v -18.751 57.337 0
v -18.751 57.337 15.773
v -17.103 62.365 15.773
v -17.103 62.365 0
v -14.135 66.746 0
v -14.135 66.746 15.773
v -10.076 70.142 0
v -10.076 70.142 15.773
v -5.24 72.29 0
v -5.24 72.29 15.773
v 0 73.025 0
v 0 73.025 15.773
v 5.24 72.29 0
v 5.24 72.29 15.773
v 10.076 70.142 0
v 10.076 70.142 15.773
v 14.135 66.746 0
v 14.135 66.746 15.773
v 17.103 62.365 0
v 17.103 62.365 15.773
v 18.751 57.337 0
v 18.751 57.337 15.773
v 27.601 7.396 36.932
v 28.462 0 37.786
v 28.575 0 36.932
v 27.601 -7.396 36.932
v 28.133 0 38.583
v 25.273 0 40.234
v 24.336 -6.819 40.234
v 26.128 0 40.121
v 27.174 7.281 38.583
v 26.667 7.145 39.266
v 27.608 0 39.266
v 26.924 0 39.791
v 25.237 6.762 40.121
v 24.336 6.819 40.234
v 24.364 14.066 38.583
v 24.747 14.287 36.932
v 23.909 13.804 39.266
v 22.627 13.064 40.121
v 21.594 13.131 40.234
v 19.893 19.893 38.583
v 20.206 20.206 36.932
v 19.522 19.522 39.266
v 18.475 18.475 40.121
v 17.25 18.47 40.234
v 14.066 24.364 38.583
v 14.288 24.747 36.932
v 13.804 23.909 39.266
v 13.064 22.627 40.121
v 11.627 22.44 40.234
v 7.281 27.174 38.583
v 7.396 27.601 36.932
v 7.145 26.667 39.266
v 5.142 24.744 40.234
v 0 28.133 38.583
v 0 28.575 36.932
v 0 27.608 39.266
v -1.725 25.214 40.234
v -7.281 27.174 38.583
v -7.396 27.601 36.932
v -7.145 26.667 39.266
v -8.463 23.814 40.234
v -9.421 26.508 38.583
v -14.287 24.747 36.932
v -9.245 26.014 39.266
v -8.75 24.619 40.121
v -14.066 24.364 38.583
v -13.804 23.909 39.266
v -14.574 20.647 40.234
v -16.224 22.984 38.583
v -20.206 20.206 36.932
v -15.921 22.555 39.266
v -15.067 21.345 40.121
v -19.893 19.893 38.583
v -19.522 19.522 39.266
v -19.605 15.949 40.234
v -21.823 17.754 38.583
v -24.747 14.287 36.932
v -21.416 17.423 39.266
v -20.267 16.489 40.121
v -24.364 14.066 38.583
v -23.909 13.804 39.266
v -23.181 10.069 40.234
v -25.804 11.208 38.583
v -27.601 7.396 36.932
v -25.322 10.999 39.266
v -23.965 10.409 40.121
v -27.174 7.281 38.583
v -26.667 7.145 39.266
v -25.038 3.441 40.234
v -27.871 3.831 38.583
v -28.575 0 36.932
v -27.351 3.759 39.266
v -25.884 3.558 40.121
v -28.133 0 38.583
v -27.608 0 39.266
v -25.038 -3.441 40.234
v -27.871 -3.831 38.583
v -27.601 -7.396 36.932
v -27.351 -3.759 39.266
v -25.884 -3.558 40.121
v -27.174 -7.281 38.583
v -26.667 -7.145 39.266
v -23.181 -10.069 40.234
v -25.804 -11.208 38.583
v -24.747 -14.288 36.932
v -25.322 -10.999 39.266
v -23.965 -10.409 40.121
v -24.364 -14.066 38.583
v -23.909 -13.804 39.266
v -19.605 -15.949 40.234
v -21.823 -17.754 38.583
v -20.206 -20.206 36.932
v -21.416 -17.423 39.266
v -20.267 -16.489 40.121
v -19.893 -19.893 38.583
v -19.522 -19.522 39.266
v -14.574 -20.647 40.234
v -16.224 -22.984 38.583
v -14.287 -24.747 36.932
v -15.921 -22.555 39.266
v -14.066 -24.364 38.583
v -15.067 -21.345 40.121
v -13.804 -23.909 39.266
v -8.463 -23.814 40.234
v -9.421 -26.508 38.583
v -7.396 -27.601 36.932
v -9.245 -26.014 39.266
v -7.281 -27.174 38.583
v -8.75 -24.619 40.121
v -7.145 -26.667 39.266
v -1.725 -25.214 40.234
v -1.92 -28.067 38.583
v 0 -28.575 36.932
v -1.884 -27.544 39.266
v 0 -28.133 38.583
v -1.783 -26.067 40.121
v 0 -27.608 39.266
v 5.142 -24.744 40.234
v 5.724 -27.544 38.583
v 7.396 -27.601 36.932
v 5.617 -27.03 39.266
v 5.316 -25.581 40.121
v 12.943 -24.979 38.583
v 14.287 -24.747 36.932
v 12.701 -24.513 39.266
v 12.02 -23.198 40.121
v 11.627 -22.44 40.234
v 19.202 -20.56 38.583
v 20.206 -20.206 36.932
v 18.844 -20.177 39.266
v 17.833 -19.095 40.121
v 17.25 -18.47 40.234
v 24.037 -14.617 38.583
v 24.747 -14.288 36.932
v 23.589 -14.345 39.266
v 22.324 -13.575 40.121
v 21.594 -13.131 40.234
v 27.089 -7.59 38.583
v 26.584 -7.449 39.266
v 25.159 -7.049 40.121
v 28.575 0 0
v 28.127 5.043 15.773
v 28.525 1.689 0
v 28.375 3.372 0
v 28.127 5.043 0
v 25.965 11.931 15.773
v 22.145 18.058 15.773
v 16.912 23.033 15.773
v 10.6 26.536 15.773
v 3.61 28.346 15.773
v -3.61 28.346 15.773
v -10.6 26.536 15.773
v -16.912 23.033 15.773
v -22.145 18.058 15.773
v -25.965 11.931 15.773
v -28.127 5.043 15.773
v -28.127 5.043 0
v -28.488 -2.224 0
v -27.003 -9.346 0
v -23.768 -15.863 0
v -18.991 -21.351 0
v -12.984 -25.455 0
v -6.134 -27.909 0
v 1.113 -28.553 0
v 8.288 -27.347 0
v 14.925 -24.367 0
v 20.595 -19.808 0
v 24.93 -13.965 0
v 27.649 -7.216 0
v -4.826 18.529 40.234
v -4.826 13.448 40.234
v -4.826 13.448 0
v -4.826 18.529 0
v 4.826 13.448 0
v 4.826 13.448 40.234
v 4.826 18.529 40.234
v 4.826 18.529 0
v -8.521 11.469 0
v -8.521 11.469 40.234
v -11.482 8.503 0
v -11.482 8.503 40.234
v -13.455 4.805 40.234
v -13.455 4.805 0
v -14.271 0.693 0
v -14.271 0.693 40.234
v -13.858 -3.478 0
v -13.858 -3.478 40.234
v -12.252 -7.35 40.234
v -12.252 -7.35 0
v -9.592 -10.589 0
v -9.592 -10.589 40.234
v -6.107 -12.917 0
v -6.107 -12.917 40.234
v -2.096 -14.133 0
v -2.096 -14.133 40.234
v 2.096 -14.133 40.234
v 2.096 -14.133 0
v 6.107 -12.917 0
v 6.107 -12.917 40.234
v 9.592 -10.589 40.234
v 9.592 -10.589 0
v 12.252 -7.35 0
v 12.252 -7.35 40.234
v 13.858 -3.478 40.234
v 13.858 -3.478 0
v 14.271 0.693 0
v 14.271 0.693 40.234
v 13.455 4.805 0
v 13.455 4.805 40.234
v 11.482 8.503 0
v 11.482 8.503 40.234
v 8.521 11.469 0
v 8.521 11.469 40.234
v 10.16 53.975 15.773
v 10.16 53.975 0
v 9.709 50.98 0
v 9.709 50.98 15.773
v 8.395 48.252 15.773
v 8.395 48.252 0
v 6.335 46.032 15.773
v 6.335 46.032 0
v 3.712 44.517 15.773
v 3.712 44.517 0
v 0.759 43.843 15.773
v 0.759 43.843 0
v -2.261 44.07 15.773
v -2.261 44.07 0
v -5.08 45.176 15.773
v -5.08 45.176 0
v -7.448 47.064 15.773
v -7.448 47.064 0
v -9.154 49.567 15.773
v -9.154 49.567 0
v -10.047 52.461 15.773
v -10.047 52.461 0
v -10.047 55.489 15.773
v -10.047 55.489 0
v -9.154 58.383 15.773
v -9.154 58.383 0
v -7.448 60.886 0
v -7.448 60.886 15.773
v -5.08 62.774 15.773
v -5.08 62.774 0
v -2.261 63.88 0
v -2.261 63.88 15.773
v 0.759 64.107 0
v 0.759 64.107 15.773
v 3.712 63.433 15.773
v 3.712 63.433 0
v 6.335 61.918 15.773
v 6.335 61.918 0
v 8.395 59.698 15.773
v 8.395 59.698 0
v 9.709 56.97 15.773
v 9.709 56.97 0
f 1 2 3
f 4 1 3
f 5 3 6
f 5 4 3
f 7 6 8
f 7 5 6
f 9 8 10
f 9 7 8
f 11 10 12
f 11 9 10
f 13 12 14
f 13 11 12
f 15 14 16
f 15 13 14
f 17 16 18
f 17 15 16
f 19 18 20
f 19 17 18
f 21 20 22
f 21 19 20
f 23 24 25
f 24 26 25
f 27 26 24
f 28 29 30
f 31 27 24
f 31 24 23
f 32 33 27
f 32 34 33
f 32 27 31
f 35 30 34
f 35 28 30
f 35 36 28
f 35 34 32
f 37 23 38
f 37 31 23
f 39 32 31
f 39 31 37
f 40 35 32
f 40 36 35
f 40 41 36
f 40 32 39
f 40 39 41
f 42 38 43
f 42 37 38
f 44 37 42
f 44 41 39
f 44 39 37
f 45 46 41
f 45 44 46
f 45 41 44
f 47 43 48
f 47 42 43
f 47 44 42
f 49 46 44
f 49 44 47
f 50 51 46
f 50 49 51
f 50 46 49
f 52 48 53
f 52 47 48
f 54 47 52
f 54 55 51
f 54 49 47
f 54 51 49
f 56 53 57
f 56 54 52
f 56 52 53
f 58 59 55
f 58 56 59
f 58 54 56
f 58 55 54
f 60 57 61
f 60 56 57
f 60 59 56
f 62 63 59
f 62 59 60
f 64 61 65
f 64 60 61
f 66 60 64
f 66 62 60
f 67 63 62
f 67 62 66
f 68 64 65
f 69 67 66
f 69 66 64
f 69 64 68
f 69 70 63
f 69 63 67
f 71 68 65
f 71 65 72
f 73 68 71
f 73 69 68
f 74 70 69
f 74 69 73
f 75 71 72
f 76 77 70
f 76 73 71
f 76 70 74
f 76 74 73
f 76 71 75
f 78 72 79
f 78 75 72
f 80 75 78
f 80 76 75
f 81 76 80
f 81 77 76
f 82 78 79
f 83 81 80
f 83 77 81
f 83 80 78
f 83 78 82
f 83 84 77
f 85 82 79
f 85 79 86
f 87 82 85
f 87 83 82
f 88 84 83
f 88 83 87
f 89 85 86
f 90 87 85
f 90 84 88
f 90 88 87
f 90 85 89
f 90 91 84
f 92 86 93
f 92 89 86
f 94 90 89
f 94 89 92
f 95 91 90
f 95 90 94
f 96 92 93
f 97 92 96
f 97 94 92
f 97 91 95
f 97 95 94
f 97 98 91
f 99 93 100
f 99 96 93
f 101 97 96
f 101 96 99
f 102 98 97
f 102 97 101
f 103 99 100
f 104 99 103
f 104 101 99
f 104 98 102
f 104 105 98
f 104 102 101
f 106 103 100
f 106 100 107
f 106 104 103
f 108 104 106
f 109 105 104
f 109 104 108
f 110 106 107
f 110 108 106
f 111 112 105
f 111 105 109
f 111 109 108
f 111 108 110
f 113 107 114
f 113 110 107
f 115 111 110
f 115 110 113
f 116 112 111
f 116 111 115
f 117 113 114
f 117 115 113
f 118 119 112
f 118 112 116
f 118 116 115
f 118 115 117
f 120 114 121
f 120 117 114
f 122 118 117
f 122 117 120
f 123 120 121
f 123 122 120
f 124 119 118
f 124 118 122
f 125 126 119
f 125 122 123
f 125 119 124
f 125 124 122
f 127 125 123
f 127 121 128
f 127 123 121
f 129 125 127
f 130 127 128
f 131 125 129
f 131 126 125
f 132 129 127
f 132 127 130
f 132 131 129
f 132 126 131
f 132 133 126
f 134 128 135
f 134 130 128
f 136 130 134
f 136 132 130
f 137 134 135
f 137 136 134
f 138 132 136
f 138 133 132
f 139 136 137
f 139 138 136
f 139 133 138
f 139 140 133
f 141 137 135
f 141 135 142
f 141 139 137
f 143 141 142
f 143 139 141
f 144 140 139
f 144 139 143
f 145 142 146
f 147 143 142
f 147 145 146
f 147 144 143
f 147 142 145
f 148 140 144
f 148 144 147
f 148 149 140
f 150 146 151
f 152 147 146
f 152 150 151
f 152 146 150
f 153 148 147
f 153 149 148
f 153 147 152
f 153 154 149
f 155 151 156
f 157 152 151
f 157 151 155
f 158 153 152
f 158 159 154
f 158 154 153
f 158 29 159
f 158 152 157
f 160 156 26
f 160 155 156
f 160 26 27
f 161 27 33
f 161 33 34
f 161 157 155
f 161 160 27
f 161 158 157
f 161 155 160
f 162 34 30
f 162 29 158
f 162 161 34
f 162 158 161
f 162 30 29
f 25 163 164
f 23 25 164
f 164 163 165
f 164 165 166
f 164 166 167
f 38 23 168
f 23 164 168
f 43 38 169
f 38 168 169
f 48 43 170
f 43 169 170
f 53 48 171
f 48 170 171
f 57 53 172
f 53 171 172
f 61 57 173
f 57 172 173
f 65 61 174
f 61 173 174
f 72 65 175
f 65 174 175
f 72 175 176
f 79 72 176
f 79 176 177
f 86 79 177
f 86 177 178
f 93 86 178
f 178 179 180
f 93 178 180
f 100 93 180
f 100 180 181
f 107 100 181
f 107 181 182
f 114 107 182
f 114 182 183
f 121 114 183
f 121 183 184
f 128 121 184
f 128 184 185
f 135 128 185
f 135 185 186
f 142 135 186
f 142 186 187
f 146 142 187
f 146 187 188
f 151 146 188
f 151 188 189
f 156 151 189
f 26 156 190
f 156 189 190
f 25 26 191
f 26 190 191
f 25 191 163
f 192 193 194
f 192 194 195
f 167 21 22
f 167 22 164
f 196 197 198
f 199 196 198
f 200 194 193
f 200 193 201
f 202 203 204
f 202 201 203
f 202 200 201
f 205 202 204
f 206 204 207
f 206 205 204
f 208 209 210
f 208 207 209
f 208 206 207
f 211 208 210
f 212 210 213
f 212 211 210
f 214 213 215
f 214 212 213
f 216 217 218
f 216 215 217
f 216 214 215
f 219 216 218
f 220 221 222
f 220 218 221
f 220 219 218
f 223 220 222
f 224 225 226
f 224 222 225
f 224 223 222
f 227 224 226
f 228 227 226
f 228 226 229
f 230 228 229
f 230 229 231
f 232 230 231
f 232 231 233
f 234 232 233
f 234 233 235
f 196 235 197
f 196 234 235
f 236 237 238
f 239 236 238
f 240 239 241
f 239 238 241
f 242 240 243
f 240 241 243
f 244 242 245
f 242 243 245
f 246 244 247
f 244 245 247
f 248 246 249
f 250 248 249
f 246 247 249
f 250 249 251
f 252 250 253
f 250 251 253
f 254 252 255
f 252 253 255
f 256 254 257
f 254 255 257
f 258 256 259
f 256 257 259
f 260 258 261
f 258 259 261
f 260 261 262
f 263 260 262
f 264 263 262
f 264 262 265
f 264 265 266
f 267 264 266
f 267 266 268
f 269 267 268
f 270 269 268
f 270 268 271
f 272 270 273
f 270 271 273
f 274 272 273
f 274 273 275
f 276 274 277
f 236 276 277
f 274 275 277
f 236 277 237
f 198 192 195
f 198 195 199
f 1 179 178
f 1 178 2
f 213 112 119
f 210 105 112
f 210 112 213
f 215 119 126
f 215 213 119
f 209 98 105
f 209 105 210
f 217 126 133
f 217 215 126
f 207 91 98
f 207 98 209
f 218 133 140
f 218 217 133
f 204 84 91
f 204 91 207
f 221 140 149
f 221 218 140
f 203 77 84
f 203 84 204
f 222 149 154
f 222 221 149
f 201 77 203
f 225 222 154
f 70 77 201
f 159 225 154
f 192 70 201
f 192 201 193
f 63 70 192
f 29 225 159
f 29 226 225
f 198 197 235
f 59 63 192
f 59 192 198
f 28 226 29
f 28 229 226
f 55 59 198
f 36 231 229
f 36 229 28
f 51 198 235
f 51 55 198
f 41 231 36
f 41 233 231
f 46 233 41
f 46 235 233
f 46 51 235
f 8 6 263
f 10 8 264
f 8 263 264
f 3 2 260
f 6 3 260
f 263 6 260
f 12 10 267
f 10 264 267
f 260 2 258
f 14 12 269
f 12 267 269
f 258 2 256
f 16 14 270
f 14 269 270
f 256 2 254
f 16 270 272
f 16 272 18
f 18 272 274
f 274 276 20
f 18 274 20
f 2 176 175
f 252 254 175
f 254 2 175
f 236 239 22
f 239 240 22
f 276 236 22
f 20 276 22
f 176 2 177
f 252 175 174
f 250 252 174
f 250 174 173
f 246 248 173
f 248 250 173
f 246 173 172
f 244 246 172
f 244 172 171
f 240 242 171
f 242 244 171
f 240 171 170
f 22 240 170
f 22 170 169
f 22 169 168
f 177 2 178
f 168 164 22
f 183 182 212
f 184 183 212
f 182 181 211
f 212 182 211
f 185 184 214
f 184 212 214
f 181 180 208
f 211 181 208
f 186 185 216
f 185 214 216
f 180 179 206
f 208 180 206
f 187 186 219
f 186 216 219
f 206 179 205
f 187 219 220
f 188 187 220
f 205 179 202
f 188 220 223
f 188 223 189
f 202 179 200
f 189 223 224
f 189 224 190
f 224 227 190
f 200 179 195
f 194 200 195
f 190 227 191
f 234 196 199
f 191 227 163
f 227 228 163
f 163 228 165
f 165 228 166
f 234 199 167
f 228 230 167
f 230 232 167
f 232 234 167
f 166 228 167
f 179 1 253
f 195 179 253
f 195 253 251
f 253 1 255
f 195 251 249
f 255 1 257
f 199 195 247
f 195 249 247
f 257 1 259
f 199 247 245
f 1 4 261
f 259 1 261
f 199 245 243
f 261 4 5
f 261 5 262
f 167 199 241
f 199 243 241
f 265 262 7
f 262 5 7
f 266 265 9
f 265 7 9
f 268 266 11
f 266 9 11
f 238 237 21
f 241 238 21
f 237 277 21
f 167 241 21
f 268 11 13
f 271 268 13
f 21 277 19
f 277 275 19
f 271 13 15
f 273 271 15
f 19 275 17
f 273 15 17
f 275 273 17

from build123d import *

# Parameters (mm, degrees)
F0_R     = 28.575
F0_R_2   = 14.2875
F1_DEPTH = 40.2336
F2_R     = 10.16
F3_DEPTH = 15.7734
F4_W     = 9.652
F4_H     = 5.0815351207
F5_DEPTH = 40.2336
F6_R     = 3.302


with BuildPart() as f1:
    # F0 (on Top) → F1 (new body)
    with BuildSketch(Plane.XY):
        Circle(F0_R)
        Circle(F0_R_2, mode=Mode.SUBTRACT)
    extrude(amount=F1_DEPTH)

    # F2 (on face) → F3 (join)
    with BuildSketch(Plane(origin=(0, 0, 0), x_dir=(1, 0, 0), z_dir=(0, 0, -1))):
        with BuildLine():
            Line((-28.1265415171, -5.042646853), (-18.7510276535, -57.3367647059))
            ThreePointArc((-18.7510276535, -57.3367647059), (0, -73.025), (18.7510276535, -57.3367647059))
            Line((18.7510276535, -57.3367647059), (28.1265414639, -5.0426471501))
            ThreePointArc((28.1265414639, -5.0426471501), (-1.509e-07, -28.575), (-28.1265415171, -5.042646853))
        make_face()
        with Locations((0, -53.975)):
            Circle(F2_R, mode=Mode.SUBTRACT)
    extrude(amount=-F3_DEPTH)

    # F4 (on face) → F5 (cut, through all)
    with BuildSketch(Plane.XY.offset(40.2336)):
        with Locations((0, 15.9885324397)):
            Rectangle(F4_W, F4_H)
    extrude(amount=-F5_DEPTH, mode=Mode.SUBTRACT)

    # F6
    f6_edges = [f1.edges().sort_by_distance(p)[0] for p in [
        (-28.575, 0, 40.2336),
    ]]
    fillet(f6_edges, radius=F6_R)


solid = f1.part
